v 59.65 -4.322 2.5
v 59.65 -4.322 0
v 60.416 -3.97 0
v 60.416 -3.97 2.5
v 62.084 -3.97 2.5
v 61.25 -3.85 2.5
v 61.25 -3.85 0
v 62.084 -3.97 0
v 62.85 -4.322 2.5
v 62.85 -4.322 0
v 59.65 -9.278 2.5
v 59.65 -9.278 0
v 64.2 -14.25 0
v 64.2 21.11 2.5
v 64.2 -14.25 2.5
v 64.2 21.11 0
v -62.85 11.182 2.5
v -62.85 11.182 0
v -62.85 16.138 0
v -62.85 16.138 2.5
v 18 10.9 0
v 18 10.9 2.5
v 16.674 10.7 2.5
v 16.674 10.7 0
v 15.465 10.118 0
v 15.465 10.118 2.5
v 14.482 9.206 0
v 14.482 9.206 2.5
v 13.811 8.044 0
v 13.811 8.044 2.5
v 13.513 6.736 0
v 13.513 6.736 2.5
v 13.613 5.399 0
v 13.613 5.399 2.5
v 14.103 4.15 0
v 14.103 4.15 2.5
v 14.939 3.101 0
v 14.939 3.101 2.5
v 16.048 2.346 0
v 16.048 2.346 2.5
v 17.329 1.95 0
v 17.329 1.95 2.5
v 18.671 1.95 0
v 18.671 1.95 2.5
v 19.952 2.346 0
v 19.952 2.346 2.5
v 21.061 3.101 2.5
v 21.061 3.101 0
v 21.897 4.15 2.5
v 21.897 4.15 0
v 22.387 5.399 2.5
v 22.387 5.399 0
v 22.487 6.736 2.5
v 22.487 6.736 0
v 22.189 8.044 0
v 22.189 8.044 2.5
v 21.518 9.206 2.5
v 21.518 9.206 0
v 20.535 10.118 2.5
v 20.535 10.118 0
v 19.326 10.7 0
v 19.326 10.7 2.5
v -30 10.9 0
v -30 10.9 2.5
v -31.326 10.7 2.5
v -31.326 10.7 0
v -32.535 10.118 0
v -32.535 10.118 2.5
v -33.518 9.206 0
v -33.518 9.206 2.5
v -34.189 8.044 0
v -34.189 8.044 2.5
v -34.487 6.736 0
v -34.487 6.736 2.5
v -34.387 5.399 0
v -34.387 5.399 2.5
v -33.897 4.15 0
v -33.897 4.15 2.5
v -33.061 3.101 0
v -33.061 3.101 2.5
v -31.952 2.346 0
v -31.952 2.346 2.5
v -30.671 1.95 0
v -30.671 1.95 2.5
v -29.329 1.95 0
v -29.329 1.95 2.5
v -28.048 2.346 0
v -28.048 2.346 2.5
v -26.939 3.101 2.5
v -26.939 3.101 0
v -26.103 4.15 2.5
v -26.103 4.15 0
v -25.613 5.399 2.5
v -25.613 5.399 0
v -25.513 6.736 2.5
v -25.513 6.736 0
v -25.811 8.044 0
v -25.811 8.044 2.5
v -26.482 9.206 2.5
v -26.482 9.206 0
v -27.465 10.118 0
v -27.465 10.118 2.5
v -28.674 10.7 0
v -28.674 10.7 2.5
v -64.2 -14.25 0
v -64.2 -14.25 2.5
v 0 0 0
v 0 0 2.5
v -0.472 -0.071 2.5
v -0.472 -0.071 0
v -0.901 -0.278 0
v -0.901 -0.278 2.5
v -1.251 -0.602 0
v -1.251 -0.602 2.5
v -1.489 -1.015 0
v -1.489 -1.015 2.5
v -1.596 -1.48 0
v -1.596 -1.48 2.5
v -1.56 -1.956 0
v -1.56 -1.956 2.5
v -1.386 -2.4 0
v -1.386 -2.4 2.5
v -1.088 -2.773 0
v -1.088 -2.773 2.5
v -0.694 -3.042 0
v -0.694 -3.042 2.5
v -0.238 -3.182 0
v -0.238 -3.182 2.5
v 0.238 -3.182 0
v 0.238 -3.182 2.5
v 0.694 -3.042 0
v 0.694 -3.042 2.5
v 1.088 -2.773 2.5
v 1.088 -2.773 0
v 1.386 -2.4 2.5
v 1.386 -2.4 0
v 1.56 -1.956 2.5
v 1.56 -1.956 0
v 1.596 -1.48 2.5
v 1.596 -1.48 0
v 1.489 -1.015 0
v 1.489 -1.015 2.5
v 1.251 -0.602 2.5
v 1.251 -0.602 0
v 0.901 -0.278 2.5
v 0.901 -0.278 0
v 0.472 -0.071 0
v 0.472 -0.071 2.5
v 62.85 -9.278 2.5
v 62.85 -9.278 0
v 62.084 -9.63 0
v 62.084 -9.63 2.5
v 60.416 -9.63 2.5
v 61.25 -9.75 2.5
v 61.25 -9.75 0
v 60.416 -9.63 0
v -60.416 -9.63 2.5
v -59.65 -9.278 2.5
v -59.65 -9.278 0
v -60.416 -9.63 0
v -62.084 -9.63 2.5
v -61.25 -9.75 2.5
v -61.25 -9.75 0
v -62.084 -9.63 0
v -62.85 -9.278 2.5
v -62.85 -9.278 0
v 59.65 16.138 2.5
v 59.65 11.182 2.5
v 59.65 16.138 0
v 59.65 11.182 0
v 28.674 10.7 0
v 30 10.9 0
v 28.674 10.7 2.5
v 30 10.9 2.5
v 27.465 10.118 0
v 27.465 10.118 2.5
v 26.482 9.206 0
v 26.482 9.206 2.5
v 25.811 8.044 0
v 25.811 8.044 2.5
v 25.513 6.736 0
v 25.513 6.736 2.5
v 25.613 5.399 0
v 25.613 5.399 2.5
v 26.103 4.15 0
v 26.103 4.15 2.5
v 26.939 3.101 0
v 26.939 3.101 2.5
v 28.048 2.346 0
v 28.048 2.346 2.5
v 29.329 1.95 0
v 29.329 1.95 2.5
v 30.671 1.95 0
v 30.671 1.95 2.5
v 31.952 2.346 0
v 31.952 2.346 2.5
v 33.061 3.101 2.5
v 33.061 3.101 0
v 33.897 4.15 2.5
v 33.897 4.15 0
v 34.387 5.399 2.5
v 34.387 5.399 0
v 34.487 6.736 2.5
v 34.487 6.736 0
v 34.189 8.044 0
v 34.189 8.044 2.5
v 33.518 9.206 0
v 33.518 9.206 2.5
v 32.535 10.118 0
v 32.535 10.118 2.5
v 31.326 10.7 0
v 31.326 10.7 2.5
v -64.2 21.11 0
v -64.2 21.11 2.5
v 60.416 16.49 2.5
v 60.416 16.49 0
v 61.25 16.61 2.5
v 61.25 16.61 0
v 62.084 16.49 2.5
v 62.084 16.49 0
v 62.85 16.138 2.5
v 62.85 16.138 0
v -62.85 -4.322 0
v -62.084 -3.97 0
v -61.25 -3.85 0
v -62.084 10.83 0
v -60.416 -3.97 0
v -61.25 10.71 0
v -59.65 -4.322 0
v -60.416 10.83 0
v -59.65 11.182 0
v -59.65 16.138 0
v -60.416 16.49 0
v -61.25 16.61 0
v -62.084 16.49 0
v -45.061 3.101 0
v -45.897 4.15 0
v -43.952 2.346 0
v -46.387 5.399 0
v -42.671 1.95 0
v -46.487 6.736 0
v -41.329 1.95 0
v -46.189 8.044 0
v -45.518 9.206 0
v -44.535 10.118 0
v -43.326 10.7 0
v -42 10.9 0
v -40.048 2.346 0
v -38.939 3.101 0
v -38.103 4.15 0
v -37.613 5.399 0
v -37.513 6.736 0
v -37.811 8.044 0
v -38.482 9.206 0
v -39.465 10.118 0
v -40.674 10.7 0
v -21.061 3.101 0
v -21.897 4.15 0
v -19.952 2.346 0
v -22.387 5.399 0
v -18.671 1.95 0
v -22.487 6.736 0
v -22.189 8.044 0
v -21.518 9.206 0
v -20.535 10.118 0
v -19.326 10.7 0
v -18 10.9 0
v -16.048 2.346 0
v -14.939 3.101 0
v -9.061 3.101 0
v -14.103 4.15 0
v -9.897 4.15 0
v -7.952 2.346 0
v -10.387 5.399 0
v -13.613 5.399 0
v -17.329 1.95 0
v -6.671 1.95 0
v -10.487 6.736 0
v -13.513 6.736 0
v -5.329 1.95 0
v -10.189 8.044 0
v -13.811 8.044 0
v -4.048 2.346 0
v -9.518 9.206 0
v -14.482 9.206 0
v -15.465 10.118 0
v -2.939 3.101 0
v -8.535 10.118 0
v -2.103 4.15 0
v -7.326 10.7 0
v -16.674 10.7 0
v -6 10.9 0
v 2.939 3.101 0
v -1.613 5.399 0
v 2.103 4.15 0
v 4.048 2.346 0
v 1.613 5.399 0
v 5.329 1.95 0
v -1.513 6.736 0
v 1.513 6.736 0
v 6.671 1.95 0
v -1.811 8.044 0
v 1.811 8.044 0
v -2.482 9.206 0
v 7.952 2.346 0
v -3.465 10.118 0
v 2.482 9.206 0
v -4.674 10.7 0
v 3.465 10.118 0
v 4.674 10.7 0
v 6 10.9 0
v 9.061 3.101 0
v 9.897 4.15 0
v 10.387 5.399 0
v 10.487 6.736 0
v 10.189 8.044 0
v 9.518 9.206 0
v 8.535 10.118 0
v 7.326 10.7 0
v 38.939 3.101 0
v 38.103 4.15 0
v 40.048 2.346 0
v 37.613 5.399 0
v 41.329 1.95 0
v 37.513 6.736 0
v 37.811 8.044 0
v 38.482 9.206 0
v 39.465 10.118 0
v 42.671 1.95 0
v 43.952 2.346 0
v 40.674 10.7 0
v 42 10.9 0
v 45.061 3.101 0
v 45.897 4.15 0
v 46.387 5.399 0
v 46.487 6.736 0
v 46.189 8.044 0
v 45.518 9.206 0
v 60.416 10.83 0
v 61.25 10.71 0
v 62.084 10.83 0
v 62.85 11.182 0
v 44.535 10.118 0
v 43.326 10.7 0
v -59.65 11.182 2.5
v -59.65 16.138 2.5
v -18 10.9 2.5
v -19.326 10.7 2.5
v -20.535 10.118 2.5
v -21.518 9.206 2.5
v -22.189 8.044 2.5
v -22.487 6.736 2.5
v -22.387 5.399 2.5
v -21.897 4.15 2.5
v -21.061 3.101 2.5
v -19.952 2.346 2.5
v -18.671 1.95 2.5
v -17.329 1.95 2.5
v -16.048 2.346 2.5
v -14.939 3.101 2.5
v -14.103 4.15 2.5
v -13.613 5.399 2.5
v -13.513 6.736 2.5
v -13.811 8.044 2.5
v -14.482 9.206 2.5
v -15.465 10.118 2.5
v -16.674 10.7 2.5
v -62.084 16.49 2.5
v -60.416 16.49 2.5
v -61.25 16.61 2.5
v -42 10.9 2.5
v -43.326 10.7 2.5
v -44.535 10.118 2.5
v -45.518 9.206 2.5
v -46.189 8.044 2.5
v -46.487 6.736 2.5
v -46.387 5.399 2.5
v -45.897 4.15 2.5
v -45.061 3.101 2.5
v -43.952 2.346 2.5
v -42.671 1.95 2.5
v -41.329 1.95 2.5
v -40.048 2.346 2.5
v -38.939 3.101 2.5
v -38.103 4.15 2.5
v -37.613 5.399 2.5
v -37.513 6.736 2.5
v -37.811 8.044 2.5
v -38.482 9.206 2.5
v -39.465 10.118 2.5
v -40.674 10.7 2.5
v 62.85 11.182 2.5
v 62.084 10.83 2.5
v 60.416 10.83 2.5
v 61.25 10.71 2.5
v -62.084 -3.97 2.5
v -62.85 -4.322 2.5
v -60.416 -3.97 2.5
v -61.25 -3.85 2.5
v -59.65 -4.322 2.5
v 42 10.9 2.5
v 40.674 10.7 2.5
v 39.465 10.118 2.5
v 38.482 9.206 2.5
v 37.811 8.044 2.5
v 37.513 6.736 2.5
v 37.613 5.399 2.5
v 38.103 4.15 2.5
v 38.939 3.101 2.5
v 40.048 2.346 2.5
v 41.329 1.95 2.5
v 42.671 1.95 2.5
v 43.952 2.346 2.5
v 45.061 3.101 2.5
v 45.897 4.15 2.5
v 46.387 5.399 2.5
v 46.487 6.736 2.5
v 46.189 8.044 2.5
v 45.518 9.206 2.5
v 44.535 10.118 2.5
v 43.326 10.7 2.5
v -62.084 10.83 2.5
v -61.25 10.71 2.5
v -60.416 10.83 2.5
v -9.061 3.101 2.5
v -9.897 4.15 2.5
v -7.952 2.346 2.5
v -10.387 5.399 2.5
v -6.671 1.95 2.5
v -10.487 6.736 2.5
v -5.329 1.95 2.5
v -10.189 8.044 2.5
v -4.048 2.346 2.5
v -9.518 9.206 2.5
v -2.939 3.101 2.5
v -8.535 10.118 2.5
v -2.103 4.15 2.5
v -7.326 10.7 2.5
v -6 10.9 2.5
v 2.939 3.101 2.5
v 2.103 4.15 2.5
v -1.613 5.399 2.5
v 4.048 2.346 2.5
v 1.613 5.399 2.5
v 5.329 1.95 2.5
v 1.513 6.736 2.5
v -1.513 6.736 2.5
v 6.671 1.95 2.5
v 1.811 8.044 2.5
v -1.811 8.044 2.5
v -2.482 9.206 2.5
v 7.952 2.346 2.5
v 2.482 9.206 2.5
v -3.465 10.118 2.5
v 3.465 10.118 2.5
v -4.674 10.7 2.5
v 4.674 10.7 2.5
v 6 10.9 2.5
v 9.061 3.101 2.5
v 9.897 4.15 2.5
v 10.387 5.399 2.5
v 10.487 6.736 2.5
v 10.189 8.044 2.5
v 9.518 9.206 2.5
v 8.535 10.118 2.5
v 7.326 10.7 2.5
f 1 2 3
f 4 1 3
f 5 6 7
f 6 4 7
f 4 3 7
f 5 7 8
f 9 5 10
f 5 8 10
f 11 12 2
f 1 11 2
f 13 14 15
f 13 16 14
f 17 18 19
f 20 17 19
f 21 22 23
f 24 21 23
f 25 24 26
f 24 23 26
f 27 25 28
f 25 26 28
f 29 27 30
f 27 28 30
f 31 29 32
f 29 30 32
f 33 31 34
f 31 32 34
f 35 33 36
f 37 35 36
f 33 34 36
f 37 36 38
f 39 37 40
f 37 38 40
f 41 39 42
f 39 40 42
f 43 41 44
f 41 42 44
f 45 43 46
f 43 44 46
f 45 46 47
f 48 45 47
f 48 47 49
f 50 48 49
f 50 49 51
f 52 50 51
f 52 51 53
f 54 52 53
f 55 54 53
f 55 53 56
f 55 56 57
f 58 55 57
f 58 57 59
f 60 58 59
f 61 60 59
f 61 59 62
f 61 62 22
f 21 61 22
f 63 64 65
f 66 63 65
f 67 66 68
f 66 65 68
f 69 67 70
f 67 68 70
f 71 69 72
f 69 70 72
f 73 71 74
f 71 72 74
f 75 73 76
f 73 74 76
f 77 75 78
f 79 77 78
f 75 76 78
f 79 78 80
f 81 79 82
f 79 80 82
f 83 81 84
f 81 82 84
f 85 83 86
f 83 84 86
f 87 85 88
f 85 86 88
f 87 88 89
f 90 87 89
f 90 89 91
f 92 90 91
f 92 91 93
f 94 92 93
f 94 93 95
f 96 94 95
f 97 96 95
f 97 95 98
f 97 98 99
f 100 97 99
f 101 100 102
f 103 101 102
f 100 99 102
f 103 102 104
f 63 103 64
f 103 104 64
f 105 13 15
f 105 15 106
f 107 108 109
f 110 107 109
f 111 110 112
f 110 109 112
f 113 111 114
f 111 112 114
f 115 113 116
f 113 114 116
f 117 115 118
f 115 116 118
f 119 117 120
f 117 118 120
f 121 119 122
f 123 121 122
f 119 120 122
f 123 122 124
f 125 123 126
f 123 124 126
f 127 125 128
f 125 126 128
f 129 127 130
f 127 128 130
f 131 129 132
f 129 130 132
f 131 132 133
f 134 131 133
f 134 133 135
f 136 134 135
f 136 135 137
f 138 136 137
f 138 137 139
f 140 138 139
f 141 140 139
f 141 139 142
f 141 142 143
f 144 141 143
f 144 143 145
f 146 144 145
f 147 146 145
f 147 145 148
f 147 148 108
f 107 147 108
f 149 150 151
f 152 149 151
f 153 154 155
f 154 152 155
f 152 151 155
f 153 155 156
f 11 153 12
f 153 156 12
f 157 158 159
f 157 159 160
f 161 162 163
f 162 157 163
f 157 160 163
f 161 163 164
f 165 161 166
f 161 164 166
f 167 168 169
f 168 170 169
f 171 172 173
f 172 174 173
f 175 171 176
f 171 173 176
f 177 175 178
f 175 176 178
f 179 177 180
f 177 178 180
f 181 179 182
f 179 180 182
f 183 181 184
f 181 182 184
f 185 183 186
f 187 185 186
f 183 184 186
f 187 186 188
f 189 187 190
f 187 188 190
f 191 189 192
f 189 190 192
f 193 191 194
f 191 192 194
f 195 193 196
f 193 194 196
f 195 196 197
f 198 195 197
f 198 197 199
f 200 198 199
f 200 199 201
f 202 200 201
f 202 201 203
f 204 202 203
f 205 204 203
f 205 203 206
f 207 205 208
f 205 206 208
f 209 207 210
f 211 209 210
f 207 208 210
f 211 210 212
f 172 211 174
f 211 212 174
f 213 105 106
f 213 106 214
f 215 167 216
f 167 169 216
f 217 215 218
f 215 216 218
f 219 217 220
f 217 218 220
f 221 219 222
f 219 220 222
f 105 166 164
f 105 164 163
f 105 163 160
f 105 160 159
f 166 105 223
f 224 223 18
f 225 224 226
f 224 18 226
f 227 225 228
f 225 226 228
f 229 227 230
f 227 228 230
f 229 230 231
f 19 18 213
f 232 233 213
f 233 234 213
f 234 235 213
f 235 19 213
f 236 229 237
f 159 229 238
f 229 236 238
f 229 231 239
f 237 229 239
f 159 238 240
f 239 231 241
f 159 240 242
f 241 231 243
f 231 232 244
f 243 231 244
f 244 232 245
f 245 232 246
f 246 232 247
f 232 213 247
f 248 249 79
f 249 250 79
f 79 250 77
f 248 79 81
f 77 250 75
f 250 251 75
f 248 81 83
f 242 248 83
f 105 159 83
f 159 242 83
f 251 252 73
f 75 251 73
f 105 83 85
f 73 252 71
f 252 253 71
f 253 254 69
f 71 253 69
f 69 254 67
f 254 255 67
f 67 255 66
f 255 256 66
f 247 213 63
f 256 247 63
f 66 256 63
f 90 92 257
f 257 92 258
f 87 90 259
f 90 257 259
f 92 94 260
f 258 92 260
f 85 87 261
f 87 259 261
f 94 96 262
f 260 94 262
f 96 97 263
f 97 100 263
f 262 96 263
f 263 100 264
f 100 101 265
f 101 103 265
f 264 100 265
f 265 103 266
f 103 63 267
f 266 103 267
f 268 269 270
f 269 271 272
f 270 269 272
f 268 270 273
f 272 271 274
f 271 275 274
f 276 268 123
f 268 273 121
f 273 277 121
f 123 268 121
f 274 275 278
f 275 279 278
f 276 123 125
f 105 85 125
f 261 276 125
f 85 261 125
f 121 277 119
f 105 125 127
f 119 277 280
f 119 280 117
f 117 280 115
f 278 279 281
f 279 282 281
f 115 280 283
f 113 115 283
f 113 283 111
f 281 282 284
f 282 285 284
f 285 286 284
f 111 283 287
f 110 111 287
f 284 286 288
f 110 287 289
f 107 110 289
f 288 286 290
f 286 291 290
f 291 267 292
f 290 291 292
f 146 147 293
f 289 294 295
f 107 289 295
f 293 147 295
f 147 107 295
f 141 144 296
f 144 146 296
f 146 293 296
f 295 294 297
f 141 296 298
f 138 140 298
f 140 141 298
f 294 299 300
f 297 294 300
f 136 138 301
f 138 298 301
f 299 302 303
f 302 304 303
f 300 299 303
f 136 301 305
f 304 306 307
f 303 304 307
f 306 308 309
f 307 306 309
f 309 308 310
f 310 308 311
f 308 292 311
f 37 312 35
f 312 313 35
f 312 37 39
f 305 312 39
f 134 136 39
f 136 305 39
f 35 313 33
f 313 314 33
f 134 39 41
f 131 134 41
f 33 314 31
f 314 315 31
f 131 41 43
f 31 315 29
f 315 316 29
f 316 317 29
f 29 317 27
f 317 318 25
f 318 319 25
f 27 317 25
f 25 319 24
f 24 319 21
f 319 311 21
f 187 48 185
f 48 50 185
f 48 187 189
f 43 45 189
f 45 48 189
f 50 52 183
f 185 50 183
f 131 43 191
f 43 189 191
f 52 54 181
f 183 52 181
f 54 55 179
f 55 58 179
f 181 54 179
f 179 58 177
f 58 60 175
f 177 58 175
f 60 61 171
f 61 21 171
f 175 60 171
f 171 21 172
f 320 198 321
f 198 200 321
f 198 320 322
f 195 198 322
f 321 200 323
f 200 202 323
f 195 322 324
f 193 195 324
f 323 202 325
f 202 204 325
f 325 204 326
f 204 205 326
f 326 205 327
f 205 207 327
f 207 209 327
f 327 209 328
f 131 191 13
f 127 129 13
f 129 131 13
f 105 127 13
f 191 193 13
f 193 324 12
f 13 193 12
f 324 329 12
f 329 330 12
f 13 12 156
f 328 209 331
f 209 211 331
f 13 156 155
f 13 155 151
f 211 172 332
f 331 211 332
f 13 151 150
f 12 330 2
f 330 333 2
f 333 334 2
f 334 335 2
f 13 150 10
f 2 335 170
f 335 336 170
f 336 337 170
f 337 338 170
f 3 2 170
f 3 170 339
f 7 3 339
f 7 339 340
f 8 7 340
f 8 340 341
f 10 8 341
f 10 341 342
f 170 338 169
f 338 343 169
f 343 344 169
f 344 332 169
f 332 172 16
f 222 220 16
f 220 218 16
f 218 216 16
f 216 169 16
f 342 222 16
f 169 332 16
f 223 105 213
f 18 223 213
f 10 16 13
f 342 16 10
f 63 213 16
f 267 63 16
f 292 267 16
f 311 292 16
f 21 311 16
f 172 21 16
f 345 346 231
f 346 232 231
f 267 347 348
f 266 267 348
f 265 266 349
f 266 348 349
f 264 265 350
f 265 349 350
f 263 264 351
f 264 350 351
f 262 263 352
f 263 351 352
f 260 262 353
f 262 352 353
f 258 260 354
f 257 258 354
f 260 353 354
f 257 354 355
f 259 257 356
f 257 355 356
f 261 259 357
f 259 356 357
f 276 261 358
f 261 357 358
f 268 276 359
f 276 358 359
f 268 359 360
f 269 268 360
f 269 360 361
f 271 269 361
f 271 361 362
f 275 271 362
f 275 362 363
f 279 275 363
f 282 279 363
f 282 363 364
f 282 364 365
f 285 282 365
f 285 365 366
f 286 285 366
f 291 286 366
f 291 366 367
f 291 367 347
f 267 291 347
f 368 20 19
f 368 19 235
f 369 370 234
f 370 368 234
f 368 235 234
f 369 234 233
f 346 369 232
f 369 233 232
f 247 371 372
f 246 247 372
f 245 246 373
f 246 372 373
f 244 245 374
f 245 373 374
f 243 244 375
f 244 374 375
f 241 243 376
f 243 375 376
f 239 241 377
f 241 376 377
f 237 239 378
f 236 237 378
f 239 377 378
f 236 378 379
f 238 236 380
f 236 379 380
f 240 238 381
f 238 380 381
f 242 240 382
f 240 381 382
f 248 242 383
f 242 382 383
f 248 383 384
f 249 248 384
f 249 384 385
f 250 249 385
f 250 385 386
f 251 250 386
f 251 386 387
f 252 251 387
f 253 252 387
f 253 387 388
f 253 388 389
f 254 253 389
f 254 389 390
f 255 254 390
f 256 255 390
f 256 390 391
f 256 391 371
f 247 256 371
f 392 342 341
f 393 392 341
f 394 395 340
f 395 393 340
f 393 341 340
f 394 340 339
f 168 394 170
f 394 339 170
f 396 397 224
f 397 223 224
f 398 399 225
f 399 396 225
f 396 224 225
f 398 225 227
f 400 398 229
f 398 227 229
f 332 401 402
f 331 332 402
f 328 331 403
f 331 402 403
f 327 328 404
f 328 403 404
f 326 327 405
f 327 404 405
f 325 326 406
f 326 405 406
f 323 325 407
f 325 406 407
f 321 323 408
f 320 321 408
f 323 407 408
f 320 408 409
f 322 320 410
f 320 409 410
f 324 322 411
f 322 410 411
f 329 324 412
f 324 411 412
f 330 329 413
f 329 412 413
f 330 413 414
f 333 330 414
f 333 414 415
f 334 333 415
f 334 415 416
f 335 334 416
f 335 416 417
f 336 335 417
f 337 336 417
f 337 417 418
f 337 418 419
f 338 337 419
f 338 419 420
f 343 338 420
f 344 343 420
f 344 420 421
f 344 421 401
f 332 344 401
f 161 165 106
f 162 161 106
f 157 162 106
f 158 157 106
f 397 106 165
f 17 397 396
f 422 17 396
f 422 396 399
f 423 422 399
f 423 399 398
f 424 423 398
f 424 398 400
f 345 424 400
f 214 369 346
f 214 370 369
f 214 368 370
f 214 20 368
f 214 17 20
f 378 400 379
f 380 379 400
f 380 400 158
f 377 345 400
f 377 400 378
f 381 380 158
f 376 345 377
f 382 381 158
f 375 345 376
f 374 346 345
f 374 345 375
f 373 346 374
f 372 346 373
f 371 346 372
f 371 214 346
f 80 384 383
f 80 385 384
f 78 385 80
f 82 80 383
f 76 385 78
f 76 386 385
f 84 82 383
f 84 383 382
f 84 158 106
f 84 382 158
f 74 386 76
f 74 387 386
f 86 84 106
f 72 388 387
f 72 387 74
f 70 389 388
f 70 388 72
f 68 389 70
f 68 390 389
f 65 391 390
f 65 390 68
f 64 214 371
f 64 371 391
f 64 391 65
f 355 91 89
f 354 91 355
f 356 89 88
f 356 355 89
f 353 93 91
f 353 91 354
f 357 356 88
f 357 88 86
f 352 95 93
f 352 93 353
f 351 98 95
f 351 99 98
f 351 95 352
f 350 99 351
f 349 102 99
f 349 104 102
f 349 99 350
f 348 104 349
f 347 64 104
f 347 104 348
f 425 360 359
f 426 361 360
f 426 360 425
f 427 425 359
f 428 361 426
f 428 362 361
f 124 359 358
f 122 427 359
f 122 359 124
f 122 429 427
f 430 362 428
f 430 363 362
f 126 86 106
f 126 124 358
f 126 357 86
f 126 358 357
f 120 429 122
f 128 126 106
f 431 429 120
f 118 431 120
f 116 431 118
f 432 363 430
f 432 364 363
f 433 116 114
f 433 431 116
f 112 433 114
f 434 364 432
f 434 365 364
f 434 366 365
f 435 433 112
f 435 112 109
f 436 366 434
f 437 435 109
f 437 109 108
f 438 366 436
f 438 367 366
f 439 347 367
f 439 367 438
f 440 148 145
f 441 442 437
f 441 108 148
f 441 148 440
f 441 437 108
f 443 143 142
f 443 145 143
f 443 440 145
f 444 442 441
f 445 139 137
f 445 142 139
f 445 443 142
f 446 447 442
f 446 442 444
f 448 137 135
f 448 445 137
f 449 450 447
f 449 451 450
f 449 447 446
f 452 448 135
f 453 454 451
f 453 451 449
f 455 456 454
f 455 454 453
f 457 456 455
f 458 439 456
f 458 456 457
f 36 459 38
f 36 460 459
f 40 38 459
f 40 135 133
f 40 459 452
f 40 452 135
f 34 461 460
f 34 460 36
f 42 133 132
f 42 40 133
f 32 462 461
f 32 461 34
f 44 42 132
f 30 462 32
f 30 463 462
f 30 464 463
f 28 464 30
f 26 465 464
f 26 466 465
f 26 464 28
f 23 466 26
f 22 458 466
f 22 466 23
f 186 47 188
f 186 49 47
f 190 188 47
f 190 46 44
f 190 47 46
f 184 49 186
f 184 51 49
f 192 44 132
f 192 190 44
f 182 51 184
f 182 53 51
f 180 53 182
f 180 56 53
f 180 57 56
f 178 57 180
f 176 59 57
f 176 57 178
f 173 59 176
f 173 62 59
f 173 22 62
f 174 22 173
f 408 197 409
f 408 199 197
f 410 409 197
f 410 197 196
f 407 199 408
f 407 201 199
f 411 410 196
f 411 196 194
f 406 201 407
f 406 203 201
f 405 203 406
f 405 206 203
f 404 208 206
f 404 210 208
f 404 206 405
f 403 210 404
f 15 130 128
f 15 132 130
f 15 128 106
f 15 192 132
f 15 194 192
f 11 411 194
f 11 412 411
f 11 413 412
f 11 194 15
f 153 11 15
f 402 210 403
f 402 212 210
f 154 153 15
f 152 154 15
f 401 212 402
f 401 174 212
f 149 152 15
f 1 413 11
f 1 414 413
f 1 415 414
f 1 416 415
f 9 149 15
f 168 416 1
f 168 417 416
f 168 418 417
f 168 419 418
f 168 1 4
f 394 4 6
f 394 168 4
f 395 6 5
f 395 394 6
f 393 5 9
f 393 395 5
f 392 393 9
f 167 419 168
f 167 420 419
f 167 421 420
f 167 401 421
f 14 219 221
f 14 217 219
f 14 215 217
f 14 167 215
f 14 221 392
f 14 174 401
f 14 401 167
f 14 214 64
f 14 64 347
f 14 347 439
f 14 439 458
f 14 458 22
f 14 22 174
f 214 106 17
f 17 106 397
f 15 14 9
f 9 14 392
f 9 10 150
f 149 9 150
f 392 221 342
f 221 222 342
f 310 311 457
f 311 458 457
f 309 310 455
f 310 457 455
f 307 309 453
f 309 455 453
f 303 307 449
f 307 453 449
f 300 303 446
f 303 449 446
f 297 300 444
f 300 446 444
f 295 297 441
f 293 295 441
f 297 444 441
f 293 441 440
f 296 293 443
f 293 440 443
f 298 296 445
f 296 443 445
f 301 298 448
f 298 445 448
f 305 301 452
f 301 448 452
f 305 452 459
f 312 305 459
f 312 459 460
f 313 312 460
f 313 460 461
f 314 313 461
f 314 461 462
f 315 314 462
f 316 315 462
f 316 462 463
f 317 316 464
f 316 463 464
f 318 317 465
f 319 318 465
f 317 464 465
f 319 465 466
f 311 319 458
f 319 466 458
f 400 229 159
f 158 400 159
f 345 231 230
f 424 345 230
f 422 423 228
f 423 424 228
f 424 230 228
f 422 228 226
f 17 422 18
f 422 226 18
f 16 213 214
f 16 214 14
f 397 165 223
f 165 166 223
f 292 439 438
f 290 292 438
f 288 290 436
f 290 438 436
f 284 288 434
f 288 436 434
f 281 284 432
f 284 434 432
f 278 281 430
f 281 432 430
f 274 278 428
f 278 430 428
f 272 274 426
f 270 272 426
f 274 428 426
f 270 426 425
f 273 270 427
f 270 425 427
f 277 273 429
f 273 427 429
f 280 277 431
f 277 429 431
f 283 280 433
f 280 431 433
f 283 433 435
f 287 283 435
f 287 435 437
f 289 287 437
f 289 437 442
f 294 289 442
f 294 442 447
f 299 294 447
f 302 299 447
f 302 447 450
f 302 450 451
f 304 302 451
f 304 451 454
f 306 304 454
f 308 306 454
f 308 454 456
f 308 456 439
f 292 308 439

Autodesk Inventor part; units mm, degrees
ref_plane "YZ Plane" through (0, 0, 0) normal (1, 0, 0) x (0, 1, 0)
ref_plane "XZ Plane" through (0, 0, 0) normal (0, 1, 0) x (-1, 0, 0)
sketch "Sketch1" plane through (0, 0, 0) normal (0, 0, 1) x (1, 0, 0)
  line L0 (-64.2, 21.11) -> (64.2, 21.11)
  line L1 (64.2, 21.11) -> (64.2, -14.25)
  line L2 (64.2, -14.25) -> (-64.2, -14.25)
  line L3 (-64.2, -14.25) -> (-64.2, 21.11)
  line L4 (-59.65, 16.1384) -> (-59.65, 11.1816)
  line L5 (-62.85, 11.1816) -> (-62.85, 16.1384)
  line L6 (-64.2, 0) -> (64.2, 0) construction
  line L7 (-62.85, 16.1384) -> (-62.85, 11.1816)
  line L8 (-59.65, 16.1384) -> (-59.65, 11.1816)
  arc A0 (-59.65, 16.1384) -> (-62.85, 16.1384) centre (-61.25, 13.66) ccw
  arc A1 (-62.85, 11.1816) -> (-59.65, 11.1816) centre (-61.25, 13.66) ccw
  line L9 (-50, -1.6) -> (50, -1.6) construction
  line L10 (64.2, -11.9) -> (-64.2, -11.9) construction
  line L11 (0, 28.2591) -> (0, -21.7844) construction
  line L12 (-94.5, 0) -> (94.5, 0) construction
  line L13 (67.5, 3.43) -> (-67.5, 3.43) construction
  line L14 (50, 0) -> (50, -1.6) construction
  line L15 (-50, 0) -> (-50, -1.6) construction
  point P0 (0, 0)
  point P1 (-34.25, -9.4)
  point P2 (-42, 6.4)
  point P3 (0, -1.6)
  dimension "d0" = 128.4
  dimension "d1" = 35.36
  dimension "d21" = 6.4
  dimension "d46" = 1.6
  dimension "d47" = 1.6
  dimension "d50" = 2.95
  dimension "d52" = 2.95
  dimension "d130" = 2.35
  dimension "d131" = 11.9
  dimension "d132" = 10.3
  dimension "d133" = 2.5
  dimension "d145" = 0
  dimension "d152" = 135
  dimension "d155" = 17.68
  dimension "d156" = 10.23
  dimension "d157" = 64.2
  dimension "d158" = 61.25
  dimension "d159" = 67.5
  dimension "d215" = 50
  dimension "d217" = 50
  dimension "d218" = 8
  dimension "d219" = 0
  dimension "d227" = 34.25
extrude "Extrusion2" add sketch "Sketch1" along normal blind 2.5 contours L0 L1 L2 L3 | L4 A1 L5 A0
hole "Hole1" at (-42, 6.4, 0) direction (0, 0, 1) diameter 9 end through all
pattern_linear "Rectangular Pattern1" count 8 spacing 12 along (1, 0, 0) of "Hole1"
extrude "Extrusion3" cut sketch "Sketch1" along normal blind 2.5 contours L4 A1 L5 A0
pattern_linear "Rectangular Pattern2" count 2 spacing 122.5 along (1, 0, 0) count 2 spacing -20.46 along (0, 1, 0) of "Extrusion3"
hole "Hole9" at (-61.25, 13.66, 0) at (0, -1.6, 0) direction (0, 0, 1) diameter 3.2 end through all
ref_plane "Work Plane1" through (0, 0, 2.5) normal (0, 0, 1) x (1, 0, 0)
sketch "Sketch7" plane through (0, 0, 2.5) normal (0, 0, 1) x (1, 0, 0)
  line L0 (64.2, -14.25) -> (64.2, 21.11) projected
  line L1 (64.2, 21.11) -> (64.2, -14.501) construction
  line L2 (64.2, -14.501) -> (-64.2197, -14.501) construction
  line L3 (-64.2197, -14.501) -> (-64.2197, 21.11) construction
  line L4 (-64.2197, 21.11) -> (64.2, 21.11) construction
  point P0 (0, 0)
decal "Decal4"
properties part number "Frontplate_Dac8728_v12_decal"
